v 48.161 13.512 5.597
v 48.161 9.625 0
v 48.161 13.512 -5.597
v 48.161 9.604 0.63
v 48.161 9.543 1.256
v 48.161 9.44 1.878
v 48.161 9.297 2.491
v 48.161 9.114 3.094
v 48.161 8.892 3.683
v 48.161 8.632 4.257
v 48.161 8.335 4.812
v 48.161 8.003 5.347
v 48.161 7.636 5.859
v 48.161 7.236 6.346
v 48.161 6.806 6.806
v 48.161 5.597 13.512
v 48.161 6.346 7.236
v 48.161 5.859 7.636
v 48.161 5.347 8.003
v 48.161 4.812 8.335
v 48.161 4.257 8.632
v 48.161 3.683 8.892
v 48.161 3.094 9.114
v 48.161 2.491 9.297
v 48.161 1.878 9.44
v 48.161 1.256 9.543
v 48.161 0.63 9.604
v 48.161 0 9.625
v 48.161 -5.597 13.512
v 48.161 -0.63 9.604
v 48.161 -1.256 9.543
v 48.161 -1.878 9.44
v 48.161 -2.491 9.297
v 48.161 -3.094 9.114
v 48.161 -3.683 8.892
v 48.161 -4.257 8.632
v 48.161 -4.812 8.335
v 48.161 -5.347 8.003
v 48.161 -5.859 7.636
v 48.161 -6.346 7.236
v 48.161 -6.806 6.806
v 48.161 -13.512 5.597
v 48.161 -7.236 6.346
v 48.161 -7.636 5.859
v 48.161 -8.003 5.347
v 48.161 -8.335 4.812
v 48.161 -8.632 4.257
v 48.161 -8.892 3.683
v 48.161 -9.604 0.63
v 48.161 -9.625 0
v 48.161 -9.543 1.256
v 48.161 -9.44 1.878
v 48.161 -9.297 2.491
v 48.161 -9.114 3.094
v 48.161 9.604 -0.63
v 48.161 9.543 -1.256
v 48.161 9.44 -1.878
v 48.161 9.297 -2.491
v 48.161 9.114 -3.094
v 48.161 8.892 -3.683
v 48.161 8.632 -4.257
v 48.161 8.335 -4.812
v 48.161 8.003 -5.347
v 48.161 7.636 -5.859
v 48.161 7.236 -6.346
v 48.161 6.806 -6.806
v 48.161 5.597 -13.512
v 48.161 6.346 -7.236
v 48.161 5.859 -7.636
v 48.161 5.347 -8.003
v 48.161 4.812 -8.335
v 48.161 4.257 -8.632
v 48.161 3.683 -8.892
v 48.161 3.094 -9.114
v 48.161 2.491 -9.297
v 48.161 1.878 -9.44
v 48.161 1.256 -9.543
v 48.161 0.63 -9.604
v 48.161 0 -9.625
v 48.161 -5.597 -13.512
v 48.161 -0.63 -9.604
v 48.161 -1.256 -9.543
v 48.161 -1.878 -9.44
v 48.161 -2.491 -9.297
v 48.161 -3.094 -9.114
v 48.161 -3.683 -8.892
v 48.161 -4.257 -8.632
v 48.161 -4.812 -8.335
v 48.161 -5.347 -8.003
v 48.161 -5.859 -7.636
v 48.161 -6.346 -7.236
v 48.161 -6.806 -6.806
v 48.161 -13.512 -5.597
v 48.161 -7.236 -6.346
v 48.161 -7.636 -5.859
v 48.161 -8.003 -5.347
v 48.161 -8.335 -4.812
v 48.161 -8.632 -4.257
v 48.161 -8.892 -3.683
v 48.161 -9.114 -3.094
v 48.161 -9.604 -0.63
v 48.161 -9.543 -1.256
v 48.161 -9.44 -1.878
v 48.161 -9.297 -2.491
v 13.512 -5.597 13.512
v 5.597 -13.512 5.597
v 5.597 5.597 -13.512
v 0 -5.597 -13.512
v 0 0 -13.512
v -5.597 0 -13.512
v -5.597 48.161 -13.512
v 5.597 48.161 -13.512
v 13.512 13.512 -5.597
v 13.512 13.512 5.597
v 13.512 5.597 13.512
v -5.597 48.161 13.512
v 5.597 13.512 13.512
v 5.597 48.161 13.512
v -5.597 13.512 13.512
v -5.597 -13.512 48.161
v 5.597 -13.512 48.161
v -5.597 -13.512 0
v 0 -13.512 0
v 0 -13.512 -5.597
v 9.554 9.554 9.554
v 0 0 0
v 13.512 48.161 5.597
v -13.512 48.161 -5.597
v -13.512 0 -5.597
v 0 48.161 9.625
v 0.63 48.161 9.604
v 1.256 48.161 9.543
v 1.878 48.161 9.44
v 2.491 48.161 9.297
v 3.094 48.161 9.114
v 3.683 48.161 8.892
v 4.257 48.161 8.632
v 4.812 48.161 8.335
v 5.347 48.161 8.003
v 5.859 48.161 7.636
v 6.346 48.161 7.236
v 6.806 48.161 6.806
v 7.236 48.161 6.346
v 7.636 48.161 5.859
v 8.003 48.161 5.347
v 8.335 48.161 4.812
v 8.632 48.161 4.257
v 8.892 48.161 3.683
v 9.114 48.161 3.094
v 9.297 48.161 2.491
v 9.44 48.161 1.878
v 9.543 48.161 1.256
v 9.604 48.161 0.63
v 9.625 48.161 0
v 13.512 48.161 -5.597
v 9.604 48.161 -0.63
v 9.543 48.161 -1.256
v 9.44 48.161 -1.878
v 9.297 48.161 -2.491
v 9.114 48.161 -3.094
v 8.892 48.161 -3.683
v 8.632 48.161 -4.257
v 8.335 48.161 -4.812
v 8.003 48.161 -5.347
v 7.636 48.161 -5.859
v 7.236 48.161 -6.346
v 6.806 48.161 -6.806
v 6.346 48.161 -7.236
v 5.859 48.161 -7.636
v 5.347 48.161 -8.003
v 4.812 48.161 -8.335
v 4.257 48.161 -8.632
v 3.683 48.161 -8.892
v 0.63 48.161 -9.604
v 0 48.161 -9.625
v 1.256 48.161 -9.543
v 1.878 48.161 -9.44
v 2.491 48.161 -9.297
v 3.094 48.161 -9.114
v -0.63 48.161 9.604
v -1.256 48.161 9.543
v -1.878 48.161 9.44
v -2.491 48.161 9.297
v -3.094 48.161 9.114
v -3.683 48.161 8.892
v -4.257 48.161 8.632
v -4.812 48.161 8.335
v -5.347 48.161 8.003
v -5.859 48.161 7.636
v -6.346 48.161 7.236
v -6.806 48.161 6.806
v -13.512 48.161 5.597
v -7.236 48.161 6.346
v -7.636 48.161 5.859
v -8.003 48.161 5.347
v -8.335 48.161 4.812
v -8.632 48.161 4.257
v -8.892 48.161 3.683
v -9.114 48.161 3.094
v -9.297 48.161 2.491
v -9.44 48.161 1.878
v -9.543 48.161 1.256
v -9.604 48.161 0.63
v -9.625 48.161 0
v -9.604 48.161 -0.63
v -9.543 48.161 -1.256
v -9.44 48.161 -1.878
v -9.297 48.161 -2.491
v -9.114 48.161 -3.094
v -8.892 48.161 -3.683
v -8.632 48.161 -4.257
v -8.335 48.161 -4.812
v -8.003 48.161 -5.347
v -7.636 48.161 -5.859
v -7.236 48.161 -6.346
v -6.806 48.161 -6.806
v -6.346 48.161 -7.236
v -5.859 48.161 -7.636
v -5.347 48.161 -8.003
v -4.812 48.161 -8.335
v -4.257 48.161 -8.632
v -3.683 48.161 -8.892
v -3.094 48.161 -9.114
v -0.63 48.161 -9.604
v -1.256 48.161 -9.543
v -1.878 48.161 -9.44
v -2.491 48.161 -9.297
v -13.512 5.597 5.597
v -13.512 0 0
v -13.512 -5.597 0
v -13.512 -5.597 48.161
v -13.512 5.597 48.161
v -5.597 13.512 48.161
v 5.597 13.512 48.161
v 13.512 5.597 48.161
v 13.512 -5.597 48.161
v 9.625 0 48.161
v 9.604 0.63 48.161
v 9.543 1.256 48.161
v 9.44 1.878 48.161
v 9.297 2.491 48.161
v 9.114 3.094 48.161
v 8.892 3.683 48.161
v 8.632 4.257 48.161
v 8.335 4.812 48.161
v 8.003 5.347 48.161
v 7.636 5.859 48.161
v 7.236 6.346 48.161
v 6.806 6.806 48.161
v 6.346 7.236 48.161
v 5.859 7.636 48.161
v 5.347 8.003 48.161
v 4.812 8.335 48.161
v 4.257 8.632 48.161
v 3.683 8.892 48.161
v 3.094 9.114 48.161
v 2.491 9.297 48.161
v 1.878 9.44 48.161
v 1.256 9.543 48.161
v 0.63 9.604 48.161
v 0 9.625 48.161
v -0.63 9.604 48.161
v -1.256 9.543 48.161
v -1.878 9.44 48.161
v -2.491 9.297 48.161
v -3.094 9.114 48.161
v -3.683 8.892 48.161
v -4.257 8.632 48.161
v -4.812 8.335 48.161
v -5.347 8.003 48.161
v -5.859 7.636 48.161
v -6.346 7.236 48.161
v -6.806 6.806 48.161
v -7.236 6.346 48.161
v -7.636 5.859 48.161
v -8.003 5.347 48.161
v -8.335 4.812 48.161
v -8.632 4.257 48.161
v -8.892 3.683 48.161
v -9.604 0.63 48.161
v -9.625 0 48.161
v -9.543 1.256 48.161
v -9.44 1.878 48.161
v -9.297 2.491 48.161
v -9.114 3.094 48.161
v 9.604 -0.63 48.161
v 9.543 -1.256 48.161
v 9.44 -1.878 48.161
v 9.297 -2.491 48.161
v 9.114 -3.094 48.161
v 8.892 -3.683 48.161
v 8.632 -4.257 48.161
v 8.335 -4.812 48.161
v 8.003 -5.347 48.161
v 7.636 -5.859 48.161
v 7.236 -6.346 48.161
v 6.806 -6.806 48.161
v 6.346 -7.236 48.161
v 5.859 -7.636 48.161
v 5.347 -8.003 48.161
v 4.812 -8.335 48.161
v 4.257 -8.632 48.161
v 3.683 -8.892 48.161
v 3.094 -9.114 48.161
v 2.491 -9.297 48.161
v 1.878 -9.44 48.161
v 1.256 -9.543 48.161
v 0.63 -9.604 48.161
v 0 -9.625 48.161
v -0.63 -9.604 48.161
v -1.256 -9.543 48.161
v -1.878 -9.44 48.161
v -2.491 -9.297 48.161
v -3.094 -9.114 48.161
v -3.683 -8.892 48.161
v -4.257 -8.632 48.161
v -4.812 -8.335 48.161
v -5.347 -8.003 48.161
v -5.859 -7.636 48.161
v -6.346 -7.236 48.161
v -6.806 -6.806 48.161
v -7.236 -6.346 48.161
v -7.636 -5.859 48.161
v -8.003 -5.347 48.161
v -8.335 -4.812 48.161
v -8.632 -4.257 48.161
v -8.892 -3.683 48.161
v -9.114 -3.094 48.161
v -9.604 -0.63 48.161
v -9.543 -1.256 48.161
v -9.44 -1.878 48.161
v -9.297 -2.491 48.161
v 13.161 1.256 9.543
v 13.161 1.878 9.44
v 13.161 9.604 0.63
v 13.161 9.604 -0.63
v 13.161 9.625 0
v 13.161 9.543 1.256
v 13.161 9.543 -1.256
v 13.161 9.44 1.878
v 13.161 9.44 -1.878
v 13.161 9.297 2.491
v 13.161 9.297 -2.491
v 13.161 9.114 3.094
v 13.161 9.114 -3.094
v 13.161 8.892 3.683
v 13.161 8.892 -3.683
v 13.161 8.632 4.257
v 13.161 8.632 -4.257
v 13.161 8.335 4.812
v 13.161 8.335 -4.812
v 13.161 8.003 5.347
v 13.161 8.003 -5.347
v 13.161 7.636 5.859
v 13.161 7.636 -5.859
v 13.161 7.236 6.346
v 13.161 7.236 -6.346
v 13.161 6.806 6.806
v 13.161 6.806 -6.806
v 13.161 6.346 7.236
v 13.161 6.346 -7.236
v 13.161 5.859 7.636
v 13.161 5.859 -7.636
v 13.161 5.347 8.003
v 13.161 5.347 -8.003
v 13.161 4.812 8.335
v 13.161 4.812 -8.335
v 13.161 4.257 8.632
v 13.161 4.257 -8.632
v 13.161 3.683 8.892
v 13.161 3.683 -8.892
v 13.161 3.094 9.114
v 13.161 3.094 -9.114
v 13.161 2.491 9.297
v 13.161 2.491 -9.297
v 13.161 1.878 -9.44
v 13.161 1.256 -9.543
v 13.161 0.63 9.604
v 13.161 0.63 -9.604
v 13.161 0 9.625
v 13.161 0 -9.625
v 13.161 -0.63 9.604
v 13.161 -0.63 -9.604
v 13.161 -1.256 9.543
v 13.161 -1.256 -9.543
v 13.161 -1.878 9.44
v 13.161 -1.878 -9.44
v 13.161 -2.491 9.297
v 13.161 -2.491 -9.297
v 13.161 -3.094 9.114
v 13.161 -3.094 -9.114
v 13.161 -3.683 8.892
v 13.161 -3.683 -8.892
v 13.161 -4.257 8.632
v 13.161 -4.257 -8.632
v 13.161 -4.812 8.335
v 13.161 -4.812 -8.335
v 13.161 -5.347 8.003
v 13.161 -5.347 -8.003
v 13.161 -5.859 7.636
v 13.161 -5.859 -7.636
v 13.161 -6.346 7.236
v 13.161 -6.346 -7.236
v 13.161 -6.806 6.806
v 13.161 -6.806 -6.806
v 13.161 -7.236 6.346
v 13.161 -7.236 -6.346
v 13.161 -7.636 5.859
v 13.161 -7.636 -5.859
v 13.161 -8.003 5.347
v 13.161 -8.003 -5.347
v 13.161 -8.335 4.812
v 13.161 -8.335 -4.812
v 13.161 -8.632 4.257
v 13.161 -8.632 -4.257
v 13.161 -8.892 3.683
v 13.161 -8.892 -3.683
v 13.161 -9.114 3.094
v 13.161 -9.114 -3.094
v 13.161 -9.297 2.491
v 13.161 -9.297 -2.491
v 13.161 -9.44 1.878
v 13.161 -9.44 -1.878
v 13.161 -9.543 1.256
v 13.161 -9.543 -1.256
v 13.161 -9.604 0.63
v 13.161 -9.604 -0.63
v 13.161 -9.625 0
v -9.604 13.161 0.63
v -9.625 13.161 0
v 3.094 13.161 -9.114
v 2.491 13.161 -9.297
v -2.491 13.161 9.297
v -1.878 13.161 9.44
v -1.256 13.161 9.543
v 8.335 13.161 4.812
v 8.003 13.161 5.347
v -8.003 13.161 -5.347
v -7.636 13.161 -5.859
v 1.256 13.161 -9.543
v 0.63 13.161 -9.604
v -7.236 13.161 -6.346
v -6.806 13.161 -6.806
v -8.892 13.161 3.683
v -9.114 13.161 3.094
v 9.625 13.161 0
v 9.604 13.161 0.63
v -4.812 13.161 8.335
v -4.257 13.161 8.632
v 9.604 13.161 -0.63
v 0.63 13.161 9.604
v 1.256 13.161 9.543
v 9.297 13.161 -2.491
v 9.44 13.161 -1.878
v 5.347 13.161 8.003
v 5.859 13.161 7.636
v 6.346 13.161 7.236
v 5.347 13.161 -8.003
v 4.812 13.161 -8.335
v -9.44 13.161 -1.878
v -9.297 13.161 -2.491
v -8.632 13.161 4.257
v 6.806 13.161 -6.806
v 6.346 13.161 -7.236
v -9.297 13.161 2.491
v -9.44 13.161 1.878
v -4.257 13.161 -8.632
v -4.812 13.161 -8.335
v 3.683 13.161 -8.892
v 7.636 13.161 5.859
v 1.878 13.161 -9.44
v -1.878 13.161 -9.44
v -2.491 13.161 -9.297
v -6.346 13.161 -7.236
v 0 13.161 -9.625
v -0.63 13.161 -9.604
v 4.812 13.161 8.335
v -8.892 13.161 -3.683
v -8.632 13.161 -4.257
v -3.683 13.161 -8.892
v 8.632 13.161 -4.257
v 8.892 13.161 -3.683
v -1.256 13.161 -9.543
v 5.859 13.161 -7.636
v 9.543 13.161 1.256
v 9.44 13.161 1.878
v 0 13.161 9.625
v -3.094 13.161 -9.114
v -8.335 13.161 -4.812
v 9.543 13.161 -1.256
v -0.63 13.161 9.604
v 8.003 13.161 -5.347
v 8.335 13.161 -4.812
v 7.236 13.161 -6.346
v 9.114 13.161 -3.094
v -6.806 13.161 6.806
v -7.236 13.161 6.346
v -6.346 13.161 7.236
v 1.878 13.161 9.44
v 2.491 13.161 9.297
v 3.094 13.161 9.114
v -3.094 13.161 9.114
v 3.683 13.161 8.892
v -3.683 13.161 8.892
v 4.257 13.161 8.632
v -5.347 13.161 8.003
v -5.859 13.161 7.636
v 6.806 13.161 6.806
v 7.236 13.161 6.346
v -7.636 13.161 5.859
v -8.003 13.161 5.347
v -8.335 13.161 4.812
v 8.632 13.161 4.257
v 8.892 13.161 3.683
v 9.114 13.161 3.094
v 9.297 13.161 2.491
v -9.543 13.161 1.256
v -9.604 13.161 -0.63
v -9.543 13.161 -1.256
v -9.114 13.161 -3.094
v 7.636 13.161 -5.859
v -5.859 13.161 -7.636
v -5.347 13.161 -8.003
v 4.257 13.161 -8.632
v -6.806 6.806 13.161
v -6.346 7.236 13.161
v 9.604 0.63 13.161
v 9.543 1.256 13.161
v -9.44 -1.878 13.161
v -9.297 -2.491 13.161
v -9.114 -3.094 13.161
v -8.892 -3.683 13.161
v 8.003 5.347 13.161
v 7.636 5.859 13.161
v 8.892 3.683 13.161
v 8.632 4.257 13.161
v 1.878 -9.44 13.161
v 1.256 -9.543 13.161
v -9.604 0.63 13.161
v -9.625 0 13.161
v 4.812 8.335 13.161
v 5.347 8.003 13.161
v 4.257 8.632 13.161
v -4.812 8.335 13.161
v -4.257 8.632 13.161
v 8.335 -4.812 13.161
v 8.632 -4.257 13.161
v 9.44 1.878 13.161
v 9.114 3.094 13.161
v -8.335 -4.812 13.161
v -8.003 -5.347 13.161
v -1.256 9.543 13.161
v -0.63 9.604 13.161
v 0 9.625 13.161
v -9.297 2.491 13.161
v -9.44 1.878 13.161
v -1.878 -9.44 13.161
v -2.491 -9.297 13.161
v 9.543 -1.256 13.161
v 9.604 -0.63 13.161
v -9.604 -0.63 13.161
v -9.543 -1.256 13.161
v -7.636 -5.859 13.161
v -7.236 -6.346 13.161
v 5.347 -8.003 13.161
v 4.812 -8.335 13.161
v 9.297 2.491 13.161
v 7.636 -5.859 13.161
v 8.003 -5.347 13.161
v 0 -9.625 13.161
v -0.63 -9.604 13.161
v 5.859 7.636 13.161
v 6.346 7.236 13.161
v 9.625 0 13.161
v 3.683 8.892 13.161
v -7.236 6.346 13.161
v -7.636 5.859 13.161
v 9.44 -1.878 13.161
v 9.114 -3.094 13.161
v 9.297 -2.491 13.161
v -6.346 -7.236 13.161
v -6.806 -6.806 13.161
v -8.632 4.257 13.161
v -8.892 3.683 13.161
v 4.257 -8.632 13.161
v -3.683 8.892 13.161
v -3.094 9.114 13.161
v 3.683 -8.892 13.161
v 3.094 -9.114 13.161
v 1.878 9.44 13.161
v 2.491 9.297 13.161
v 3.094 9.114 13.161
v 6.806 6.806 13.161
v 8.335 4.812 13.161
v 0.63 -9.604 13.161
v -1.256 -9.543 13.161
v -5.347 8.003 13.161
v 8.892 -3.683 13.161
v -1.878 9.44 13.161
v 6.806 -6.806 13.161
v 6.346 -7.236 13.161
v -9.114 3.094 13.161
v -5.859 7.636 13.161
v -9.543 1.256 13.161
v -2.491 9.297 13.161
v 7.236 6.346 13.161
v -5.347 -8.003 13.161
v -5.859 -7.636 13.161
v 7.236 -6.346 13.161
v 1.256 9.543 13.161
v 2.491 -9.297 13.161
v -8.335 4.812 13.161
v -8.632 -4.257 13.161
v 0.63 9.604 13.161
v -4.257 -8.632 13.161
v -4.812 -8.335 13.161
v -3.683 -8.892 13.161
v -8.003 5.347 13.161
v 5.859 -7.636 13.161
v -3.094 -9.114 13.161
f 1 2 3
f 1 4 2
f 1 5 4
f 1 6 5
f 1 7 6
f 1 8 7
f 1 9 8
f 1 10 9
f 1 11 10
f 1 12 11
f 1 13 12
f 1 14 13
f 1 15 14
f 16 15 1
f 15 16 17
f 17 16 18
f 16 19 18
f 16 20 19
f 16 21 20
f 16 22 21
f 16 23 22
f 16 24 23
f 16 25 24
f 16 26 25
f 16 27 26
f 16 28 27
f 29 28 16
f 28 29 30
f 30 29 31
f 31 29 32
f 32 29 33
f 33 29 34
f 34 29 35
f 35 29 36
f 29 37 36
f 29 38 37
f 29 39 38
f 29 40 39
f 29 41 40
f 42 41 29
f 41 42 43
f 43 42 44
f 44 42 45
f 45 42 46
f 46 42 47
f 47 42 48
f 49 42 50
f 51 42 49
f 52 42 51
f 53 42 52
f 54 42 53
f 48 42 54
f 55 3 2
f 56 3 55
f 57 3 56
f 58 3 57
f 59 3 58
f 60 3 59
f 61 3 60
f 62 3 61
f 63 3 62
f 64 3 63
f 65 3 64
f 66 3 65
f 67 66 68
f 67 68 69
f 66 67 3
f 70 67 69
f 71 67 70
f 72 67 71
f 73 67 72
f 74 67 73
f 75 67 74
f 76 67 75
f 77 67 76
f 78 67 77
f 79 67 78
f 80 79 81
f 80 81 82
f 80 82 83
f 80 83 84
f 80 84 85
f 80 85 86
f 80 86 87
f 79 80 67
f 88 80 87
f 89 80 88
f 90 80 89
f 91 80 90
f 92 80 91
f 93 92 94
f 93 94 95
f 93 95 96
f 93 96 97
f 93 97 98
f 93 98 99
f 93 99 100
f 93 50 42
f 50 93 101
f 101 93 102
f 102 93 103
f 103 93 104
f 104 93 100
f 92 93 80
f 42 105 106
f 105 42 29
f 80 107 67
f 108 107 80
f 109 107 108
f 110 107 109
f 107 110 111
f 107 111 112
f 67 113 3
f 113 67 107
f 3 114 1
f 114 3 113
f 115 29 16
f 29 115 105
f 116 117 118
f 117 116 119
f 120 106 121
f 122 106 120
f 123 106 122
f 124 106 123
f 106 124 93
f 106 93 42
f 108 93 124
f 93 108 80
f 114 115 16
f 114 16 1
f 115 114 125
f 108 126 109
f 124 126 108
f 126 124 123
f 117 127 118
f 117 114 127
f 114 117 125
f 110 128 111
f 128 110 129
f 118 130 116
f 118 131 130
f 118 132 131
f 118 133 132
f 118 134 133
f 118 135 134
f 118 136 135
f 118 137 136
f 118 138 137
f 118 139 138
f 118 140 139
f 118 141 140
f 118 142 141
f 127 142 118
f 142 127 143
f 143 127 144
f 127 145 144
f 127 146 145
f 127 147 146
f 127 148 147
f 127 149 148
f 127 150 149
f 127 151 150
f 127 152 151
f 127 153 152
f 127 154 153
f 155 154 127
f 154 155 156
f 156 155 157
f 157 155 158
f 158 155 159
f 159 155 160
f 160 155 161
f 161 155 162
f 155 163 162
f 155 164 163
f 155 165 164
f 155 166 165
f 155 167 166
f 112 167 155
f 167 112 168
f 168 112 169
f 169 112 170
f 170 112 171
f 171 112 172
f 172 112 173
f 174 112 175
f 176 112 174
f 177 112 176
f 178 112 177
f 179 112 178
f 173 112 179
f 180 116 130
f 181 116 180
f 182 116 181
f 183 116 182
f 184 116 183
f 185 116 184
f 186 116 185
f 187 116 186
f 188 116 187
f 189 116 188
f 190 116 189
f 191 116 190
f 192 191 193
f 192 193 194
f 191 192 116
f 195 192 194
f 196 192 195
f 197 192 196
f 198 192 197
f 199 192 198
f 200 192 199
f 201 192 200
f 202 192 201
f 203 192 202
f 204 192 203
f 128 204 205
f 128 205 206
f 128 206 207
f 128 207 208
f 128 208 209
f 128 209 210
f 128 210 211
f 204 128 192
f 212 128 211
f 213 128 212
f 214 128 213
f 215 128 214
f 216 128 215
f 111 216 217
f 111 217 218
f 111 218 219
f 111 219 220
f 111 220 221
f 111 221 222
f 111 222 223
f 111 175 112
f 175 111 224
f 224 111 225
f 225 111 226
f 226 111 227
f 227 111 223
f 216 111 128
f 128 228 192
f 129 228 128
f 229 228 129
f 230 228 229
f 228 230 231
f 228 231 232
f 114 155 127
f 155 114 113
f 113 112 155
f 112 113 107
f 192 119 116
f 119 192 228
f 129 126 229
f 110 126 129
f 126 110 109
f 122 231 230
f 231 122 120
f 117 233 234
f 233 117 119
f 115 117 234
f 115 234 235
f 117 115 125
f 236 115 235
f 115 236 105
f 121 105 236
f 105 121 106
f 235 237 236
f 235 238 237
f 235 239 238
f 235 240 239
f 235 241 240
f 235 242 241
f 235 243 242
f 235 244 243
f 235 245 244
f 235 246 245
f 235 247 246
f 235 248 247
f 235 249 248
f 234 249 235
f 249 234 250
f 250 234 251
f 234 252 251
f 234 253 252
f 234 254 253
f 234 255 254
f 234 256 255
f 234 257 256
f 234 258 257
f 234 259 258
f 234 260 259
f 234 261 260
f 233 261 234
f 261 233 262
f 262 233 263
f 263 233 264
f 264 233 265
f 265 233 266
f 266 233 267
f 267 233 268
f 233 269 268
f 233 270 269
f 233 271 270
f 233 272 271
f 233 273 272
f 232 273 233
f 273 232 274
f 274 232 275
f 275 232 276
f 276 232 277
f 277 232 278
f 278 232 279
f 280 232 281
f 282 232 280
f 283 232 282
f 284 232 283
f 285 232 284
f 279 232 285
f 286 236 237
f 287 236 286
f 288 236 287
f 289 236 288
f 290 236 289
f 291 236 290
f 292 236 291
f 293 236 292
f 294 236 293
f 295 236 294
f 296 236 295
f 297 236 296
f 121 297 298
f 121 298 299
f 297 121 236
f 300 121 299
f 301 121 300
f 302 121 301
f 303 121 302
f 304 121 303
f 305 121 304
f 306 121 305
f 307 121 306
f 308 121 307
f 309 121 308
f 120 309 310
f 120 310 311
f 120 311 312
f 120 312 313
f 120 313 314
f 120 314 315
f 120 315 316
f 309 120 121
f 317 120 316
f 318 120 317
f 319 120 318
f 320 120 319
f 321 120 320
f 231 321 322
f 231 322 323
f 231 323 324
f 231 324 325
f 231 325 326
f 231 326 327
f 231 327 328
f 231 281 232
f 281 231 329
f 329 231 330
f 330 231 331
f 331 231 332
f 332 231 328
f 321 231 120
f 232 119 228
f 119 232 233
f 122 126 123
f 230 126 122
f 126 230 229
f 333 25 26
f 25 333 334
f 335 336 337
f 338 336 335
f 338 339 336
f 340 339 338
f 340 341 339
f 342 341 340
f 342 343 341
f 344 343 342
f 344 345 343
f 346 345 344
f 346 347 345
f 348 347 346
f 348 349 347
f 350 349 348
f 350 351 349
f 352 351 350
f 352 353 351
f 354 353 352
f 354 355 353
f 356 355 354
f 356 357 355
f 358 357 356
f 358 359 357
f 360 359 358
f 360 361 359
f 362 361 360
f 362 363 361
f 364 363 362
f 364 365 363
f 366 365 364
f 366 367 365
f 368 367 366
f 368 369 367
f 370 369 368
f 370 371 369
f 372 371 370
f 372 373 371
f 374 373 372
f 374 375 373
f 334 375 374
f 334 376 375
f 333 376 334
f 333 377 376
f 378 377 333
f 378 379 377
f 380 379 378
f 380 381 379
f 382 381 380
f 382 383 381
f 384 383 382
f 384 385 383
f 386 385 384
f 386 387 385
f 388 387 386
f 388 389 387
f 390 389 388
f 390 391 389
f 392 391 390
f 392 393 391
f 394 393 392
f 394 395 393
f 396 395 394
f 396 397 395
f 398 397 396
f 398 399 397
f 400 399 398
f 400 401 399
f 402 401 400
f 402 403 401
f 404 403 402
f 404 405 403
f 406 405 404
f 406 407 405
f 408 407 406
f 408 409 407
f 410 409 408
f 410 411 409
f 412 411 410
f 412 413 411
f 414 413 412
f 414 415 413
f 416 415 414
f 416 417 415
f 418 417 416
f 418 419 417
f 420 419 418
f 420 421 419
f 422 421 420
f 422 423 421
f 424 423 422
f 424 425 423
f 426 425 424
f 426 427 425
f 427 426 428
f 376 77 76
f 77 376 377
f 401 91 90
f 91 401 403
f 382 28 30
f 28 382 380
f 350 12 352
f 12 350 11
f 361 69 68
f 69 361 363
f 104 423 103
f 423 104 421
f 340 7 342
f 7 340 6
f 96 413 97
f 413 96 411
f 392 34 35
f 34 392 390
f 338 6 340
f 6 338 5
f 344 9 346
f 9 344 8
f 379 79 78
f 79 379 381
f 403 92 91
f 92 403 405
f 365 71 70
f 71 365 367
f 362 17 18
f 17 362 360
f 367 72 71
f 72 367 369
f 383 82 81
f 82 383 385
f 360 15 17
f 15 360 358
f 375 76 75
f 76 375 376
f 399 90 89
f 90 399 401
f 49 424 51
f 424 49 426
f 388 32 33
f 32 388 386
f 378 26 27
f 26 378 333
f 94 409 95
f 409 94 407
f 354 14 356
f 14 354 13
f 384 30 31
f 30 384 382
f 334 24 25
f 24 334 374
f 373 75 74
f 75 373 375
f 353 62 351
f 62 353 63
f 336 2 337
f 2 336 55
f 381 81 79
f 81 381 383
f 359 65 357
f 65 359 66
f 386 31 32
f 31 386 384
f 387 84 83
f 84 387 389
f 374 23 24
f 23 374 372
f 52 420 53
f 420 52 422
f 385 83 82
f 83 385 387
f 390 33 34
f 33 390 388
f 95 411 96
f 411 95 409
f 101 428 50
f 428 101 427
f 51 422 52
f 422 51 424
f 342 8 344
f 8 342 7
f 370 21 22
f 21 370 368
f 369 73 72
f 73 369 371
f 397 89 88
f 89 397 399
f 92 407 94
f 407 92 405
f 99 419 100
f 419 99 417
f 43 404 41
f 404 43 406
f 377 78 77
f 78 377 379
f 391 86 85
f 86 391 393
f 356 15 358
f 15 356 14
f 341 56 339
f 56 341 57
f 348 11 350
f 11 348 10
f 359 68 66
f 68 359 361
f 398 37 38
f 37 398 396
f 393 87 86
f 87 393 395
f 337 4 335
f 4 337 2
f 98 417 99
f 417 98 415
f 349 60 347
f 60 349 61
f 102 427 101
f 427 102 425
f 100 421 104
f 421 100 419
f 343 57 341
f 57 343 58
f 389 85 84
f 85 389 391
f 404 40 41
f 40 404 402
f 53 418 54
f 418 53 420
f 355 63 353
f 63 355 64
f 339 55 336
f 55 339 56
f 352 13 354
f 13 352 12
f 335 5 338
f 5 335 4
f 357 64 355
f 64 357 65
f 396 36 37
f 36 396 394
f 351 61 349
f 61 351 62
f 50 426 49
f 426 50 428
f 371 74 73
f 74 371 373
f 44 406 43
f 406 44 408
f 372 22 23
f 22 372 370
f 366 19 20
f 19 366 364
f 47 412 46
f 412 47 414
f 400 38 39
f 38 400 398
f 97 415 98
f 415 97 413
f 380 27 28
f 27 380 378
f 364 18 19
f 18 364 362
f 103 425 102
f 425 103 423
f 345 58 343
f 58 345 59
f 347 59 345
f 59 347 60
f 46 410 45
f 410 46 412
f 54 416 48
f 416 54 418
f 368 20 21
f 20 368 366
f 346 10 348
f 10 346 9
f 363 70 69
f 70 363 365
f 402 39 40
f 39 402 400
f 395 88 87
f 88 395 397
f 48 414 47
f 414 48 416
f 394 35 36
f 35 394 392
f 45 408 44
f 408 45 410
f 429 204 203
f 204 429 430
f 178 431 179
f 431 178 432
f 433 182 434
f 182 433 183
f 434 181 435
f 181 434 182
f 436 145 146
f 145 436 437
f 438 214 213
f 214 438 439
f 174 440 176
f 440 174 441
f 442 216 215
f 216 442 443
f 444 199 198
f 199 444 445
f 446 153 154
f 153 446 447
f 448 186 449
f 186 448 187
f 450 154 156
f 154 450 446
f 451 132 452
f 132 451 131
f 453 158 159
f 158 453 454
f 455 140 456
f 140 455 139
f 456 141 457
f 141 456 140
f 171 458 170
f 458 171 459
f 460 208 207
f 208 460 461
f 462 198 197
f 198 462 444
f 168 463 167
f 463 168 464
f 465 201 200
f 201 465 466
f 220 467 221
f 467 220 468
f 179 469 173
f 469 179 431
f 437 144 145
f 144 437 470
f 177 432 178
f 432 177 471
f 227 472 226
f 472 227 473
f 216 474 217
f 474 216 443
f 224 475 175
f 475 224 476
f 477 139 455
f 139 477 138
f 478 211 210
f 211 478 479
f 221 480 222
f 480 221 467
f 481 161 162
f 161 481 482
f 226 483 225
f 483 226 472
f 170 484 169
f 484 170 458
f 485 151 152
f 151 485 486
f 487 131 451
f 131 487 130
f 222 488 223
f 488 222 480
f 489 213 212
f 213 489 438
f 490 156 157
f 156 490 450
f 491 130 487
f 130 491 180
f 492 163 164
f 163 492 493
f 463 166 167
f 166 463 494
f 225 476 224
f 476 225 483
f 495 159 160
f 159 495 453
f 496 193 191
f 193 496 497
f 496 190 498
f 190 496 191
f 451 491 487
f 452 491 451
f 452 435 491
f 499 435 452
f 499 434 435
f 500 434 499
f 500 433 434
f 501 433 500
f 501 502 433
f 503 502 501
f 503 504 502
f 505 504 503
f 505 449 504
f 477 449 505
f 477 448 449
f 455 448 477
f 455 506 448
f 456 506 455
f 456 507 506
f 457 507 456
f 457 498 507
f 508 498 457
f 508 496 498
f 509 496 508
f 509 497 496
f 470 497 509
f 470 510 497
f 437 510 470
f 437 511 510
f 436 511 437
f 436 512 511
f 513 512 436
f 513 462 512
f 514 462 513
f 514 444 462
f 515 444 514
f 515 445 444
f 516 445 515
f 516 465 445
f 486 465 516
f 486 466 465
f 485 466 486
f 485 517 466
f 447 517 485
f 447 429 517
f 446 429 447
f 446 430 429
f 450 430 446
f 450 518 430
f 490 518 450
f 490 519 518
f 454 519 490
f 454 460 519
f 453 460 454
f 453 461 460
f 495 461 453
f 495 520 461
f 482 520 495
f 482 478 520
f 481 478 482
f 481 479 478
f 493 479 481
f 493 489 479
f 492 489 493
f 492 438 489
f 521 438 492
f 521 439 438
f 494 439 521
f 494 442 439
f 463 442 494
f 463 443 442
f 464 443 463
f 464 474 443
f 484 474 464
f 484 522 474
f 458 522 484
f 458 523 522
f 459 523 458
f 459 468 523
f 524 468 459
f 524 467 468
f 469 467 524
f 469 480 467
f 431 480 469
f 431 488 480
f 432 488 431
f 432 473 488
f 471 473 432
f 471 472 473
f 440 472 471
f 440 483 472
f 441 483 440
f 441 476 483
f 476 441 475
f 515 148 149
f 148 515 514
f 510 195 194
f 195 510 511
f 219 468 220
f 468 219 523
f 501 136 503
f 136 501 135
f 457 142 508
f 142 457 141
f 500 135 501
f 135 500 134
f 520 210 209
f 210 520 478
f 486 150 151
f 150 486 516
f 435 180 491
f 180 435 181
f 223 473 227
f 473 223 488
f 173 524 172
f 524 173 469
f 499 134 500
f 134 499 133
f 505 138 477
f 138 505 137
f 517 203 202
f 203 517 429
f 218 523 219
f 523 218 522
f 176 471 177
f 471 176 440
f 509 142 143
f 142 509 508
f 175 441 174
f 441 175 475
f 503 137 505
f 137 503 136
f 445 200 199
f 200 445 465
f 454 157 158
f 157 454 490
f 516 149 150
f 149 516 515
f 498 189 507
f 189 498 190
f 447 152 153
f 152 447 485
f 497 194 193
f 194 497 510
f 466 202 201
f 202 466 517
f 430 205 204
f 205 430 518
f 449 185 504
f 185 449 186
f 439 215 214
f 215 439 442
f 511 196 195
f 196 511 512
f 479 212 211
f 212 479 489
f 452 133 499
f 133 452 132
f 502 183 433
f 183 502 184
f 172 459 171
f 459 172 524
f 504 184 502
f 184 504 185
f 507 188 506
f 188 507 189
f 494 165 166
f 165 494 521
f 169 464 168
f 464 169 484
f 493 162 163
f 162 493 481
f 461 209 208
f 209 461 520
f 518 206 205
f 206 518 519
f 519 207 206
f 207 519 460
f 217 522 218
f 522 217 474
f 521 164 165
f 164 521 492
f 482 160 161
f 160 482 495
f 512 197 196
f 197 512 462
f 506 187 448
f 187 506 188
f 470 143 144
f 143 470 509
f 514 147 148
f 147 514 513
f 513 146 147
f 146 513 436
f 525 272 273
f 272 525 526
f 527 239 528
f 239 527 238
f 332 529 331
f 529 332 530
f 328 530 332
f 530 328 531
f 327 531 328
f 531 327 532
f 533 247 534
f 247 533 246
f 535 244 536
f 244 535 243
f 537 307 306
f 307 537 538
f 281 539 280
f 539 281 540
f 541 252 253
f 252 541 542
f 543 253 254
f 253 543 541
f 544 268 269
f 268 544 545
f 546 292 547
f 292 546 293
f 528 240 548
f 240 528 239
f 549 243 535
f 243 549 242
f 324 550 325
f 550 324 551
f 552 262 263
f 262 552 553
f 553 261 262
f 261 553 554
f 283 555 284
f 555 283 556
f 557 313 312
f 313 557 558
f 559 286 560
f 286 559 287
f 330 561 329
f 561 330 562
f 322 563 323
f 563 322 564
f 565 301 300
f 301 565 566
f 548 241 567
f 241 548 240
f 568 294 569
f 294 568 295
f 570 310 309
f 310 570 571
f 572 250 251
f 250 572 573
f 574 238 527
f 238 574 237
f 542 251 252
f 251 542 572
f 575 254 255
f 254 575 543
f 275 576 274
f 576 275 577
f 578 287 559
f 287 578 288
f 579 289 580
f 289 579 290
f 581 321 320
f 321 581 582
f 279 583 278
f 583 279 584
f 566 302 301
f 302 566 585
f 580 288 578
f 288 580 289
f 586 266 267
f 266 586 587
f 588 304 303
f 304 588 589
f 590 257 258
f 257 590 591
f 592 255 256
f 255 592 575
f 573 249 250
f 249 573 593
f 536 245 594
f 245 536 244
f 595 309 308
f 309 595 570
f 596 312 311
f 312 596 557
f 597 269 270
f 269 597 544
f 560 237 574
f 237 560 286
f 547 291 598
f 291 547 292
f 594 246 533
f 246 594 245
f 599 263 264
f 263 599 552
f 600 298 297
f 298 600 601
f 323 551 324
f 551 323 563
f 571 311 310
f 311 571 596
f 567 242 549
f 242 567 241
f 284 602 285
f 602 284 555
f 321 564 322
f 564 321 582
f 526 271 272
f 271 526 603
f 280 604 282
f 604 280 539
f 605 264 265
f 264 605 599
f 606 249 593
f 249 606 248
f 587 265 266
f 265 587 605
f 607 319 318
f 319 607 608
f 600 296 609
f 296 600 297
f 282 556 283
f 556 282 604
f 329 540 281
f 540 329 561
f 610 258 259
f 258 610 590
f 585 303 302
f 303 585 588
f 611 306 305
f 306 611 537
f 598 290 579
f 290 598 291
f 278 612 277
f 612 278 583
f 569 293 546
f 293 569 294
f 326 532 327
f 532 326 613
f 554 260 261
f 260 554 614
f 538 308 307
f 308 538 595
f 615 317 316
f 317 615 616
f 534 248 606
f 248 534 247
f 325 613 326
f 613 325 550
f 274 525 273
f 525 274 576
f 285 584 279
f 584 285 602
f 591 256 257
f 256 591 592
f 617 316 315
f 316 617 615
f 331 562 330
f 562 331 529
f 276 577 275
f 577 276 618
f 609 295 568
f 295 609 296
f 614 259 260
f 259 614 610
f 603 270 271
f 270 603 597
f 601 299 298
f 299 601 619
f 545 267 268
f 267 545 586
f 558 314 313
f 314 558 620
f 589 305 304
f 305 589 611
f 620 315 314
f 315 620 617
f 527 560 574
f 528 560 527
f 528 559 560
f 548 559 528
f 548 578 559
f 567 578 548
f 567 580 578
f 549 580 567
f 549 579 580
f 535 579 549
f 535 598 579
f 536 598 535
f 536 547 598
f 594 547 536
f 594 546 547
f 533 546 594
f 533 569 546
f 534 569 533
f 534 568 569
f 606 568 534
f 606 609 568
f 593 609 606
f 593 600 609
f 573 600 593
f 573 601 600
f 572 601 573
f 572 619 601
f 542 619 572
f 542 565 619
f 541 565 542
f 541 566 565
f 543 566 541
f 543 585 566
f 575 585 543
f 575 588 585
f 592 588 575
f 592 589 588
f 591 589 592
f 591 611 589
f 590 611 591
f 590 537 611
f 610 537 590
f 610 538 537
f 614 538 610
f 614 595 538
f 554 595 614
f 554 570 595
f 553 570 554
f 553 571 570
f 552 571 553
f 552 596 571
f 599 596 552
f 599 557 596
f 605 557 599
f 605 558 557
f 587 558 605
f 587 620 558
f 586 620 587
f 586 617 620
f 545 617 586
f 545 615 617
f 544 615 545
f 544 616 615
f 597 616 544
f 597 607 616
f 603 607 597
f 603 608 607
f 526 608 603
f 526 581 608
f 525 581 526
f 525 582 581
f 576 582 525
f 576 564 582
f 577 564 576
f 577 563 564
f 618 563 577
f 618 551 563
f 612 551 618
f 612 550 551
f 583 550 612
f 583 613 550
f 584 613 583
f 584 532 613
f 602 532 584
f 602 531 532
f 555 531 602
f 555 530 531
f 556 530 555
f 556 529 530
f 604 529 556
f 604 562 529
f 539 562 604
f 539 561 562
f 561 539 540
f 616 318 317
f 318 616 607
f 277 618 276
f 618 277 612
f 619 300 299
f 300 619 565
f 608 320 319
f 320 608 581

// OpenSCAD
// A cube-frame corner: three 3/4-inch rods along +X, +Y and +Z.
use <../rod_connectors.scad>

$fn = $preview ? 32 : 96;

d = 19.05;
rod_connector(
    [
        rod([1, 0, 0], diameter=d, depth=35),
        rod([0, 1, 0], diameter=d, depth=35),
        rod([0, 0, 1], diameter=d, depth=35),
    ]
);
